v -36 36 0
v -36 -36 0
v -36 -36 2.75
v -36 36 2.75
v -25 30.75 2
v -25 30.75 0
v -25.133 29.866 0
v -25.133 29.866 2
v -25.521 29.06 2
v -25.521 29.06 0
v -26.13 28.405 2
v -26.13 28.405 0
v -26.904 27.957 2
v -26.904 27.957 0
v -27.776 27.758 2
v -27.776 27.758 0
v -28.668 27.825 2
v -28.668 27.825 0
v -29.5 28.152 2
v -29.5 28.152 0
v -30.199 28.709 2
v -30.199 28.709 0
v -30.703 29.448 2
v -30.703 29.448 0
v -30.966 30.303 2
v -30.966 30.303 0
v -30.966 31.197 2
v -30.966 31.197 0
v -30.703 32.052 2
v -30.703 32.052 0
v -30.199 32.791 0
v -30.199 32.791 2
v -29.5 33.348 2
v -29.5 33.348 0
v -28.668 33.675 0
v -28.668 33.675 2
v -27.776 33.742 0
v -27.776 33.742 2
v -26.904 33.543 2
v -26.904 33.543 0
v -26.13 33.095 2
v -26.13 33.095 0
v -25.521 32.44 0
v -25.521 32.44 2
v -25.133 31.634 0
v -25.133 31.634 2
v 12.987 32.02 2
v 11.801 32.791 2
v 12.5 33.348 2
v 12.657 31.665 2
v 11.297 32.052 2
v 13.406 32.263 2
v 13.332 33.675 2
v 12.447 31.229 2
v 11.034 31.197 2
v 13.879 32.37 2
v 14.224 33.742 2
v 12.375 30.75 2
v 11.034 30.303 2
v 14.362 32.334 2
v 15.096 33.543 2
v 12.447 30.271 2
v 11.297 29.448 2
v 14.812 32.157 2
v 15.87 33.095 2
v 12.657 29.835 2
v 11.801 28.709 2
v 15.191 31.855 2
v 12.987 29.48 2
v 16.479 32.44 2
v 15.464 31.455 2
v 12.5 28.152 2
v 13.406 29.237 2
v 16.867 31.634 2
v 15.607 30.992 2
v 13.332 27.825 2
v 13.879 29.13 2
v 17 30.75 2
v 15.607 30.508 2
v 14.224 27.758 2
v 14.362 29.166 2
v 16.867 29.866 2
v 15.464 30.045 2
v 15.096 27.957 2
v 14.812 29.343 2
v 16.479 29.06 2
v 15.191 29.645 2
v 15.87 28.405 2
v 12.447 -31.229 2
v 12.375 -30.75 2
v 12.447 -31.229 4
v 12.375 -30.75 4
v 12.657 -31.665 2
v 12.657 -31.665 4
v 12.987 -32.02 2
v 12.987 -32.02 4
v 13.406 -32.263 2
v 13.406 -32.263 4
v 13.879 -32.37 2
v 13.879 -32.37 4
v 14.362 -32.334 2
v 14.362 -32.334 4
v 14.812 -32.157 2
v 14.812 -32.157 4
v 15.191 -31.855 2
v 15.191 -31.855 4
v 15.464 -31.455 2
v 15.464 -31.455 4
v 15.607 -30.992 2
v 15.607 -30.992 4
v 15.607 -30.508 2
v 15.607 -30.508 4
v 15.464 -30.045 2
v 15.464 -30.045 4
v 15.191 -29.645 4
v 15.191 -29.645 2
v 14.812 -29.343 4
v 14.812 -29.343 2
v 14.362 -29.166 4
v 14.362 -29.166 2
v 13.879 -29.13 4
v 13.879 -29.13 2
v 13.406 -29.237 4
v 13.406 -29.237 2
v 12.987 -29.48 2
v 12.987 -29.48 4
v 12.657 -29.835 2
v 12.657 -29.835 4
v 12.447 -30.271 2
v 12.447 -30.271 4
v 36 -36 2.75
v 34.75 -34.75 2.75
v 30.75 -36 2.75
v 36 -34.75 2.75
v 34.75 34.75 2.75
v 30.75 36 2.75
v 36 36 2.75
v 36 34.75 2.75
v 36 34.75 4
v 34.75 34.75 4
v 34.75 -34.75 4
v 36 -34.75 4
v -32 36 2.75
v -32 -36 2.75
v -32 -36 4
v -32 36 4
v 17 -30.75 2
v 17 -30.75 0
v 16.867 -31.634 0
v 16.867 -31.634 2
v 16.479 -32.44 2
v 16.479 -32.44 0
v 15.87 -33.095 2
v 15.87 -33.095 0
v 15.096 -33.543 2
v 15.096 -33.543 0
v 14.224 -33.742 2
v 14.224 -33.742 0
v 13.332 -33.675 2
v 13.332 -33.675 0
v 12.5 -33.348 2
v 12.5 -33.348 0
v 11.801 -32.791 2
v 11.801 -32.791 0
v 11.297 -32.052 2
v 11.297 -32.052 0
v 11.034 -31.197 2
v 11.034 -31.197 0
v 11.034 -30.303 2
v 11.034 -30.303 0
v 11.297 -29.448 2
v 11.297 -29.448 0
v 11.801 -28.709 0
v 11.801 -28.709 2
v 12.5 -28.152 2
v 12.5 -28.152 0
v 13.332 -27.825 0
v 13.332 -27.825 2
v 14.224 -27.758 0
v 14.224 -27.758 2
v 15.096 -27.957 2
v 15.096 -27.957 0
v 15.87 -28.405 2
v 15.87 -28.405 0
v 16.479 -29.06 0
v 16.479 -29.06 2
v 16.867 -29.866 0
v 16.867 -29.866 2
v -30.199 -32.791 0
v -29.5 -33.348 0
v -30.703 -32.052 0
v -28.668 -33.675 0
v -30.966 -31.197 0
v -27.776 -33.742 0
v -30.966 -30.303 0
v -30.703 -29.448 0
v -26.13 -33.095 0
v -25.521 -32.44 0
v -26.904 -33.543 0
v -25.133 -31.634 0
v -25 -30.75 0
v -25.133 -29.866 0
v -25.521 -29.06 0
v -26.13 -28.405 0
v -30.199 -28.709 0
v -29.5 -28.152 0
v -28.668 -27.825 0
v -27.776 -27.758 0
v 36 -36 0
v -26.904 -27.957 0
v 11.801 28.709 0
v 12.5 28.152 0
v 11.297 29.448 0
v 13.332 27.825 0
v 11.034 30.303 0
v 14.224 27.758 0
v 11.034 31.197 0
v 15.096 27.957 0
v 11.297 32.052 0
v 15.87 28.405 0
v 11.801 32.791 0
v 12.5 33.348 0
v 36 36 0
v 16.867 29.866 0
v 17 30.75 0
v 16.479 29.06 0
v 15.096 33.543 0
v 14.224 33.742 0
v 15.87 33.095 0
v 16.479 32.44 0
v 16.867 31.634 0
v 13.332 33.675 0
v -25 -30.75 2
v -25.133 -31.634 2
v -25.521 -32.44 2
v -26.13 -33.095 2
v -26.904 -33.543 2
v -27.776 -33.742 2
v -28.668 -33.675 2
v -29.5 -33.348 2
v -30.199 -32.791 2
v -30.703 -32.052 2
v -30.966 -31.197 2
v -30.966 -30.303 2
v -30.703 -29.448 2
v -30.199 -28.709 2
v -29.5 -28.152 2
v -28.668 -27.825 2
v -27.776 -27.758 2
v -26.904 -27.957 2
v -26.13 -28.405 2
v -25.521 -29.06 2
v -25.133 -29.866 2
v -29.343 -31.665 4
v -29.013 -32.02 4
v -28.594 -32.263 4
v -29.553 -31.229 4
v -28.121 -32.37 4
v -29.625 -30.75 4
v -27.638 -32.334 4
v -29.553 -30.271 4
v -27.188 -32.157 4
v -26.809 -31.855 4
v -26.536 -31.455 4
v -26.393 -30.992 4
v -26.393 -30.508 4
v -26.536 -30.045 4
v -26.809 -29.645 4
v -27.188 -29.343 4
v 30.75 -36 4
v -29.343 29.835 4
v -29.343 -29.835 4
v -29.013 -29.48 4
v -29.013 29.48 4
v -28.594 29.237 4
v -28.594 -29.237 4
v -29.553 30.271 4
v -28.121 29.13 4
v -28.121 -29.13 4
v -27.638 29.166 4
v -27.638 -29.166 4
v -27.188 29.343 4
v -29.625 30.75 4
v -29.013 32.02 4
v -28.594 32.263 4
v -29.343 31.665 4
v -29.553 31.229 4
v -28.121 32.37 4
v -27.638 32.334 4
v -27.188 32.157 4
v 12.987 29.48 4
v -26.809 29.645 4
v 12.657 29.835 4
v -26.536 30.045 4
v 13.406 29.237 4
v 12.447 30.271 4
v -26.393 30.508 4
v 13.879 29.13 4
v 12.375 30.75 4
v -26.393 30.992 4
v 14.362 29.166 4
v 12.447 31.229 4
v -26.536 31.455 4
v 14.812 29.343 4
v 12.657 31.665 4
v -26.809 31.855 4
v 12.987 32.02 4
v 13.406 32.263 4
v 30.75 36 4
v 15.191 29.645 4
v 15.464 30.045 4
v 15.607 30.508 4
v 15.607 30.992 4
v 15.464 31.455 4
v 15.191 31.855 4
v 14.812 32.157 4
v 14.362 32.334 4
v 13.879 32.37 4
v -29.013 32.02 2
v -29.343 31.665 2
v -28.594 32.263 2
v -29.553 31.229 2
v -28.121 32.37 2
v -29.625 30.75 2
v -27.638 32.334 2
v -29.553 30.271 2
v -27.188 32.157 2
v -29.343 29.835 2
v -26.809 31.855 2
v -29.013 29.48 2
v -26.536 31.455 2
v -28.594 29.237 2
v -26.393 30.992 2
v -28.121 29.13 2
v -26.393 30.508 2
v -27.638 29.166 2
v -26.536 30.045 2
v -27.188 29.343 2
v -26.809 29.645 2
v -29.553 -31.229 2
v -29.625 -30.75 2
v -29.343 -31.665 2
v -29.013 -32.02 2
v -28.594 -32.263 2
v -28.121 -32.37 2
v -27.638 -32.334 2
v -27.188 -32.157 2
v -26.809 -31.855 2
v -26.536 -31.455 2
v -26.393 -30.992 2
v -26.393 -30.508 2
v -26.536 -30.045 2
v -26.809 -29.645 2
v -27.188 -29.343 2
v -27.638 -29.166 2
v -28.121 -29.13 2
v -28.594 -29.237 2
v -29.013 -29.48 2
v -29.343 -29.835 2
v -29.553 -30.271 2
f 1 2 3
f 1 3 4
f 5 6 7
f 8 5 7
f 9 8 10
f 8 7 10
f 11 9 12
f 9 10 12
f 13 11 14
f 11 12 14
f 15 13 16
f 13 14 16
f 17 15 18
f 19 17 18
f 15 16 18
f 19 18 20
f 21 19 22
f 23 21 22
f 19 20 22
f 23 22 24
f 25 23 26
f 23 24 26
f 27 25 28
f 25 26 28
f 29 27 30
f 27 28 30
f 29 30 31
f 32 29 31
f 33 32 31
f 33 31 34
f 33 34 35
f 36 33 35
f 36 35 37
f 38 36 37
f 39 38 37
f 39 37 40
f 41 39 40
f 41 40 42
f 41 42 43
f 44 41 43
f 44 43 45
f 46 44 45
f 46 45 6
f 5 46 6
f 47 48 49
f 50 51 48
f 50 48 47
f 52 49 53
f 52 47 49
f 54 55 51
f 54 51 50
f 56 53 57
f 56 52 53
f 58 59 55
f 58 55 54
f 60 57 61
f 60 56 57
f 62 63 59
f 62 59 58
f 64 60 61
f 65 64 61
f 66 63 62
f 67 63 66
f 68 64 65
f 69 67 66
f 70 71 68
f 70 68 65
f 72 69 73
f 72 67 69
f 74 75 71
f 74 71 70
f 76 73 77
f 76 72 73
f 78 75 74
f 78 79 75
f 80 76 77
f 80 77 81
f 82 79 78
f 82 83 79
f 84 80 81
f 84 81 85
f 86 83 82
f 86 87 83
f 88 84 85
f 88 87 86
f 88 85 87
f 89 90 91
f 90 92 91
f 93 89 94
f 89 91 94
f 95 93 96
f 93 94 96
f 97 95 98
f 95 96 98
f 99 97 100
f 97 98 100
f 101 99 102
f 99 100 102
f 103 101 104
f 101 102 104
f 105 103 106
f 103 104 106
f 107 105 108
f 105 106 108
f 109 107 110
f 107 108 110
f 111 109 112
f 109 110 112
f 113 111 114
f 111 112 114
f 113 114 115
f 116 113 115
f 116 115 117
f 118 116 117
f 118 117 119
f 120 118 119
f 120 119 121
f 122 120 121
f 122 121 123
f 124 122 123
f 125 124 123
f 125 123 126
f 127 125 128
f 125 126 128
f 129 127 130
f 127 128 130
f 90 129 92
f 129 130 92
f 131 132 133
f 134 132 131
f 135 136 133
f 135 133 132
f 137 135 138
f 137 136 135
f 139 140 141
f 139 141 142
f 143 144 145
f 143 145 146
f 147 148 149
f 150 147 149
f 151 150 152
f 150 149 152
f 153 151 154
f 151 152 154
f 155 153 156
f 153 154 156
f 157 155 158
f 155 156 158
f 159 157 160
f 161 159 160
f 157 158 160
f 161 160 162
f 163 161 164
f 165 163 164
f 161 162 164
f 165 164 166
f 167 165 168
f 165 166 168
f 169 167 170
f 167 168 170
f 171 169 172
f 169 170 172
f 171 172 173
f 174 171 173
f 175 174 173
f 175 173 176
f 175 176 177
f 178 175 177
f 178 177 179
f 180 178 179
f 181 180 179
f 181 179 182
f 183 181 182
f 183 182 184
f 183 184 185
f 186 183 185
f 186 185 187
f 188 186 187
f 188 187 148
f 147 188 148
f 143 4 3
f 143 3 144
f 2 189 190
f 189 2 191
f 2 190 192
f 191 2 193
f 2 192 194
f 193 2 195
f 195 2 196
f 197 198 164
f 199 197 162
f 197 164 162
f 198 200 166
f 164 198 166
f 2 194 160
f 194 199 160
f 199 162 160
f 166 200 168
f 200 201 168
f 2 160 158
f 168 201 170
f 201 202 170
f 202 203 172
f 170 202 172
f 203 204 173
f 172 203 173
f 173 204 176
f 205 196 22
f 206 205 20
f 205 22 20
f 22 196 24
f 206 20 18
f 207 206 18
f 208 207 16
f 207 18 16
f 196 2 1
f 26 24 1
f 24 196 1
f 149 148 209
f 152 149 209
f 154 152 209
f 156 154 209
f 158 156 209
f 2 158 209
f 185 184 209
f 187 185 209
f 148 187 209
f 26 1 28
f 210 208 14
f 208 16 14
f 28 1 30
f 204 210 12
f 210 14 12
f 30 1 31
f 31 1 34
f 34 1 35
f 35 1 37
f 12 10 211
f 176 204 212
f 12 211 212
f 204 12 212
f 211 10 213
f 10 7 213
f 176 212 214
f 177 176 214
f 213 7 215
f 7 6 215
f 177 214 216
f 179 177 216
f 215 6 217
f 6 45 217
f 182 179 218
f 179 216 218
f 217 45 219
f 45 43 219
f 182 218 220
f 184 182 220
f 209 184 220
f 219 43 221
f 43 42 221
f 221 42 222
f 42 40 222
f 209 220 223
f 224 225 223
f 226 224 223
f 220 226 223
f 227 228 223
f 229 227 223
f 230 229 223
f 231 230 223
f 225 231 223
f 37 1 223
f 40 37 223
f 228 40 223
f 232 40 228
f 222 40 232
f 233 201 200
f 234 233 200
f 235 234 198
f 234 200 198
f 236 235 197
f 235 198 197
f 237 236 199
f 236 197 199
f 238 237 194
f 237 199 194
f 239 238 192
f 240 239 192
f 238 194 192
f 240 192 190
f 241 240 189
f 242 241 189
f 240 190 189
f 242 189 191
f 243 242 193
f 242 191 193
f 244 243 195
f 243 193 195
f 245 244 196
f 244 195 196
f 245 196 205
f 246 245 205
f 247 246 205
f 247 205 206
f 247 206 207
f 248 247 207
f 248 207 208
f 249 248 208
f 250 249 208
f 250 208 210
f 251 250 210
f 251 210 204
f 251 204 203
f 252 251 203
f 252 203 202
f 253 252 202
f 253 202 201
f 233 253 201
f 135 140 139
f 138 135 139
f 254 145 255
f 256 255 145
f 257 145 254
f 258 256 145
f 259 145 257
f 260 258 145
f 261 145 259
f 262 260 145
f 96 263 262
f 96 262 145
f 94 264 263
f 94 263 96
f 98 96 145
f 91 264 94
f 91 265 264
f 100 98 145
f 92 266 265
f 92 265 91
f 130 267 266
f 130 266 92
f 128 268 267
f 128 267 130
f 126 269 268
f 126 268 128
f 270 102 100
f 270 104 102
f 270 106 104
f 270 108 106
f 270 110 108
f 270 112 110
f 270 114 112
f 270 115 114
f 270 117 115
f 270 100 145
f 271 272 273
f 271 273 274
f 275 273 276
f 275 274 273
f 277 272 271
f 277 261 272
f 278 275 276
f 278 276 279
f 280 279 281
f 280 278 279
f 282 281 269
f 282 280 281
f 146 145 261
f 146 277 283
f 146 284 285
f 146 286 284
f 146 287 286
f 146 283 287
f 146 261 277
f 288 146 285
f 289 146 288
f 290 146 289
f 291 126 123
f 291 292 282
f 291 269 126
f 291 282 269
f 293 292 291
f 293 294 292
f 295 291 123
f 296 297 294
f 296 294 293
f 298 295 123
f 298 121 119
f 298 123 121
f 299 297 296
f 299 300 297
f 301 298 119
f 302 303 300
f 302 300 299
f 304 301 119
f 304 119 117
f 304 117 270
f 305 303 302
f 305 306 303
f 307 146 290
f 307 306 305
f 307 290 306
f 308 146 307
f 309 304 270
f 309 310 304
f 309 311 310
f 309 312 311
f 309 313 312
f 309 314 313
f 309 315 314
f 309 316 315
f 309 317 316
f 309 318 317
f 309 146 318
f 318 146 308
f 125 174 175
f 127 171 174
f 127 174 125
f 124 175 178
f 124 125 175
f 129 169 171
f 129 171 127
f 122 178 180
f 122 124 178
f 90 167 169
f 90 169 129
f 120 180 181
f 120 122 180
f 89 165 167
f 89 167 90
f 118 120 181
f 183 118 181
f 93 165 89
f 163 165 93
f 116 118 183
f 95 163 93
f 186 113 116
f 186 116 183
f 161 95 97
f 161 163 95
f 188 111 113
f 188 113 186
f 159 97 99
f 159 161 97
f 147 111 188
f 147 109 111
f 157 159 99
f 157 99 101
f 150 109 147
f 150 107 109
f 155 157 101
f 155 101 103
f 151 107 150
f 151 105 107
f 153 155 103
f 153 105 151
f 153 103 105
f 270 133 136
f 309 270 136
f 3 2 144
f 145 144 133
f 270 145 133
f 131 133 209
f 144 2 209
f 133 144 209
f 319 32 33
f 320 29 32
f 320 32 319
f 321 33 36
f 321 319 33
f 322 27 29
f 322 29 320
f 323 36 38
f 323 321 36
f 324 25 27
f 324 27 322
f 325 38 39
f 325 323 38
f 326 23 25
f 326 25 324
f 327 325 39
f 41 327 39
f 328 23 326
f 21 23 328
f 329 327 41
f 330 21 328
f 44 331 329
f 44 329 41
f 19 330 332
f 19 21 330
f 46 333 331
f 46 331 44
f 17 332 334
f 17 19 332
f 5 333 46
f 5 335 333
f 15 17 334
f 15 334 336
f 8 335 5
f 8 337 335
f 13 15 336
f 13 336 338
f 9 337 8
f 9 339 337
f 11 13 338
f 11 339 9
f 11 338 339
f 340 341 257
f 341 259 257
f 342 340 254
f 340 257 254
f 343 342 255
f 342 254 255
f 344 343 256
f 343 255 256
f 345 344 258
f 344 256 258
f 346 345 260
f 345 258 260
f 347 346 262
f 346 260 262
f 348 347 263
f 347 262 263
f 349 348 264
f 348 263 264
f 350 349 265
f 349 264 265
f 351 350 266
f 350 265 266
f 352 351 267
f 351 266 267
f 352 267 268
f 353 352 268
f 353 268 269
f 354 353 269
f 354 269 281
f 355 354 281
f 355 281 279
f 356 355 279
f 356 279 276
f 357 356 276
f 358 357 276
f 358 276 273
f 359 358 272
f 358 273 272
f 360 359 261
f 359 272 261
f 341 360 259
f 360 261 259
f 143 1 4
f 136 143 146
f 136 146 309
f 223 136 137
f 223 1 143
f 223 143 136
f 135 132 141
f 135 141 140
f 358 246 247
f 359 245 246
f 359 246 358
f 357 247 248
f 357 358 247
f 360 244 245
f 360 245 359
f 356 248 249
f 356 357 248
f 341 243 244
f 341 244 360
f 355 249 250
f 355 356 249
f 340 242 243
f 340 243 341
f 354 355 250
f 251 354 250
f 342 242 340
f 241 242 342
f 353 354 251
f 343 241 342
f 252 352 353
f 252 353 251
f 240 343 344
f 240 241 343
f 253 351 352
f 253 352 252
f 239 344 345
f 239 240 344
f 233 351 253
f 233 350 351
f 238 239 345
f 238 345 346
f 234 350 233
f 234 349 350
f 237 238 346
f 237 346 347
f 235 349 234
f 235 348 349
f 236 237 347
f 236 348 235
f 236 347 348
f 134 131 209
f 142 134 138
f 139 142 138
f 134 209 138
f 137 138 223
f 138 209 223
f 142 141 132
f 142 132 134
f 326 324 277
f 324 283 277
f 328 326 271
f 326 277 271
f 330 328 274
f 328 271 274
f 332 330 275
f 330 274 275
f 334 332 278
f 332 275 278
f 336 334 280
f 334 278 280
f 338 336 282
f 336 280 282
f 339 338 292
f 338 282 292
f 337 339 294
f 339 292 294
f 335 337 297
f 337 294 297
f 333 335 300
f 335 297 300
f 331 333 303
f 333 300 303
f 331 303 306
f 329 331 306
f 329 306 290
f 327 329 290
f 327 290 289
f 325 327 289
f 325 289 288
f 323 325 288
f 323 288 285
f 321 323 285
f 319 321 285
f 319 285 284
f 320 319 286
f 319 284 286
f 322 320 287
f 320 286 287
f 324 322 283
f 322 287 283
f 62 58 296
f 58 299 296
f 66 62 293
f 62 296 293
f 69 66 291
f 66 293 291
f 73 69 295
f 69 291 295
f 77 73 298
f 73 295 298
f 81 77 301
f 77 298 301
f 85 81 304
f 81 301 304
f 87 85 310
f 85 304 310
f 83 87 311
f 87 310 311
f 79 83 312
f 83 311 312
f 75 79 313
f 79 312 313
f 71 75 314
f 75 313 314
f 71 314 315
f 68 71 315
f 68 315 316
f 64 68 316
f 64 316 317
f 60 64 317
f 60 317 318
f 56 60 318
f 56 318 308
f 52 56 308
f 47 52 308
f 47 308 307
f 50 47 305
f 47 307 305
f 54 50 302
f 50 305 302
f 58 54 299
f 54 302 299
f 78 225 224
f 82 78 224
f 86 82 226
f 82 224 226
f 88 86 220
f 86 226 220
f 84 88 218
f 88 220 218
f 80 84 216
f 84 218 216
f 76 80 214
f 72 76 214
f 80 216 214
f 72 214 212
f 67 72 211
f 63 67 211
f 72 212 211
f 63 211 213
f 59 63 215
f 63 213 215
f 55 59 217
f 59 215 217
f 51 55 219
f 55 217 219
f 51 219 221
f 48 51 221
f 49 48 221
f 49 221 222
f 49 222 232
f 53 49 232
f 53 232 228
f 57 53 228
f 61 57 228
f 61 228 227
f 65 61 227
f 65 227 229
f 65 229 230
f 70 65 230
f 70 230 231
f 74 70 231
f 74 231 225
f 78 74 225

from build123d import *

# Parameters (mm, degrees)
F0_W           = 72
F0_H           = 72
F1_DEPTH       = 2.75
F2_W           = 62.75
F2_H           = 72
F2_W_2         = 1.25
F3_DEPTH       = 1.25
F5_D           = 3.25
F5_DEPTH       = 8
F5_CBORE_D     = 6
F5_CBORE_DEPTH = 2
F6_W           = 1.25
F6_H           = 1.25
F7_DEPTH       = 1.25


with BuildPart() as f1:
    # F0 (on Top) → F1 (new body)
    with BuildSketch(Plane.XY):
        Rectangle(F0_W, F0_H)
    extrude(amount=F1_DEPTH)

    # F2 (on face) → F3 (join)
    with BuildSketch(Plane.XY.offset(2.75)):
        with Locations((-0.625, 0)):
            Rectangle(F2_W, F2_H)
        with Locations((35.375, 0)):
            Rectangle(F2_W_2, F2_H)
    extrude(amount=F3_DEPTH)

    # F5
    with Locations(Plane(origin=(0, 0, 0), x_dir=(1, 0, 0), z_dir=(0, 0, -1))):
        with Locations((-28, -30.75), (14, -30.75), (-28, 30.75), (14, 30.75)):
            CounterBoreHole(F5_D / 2, F5_CBORE_D / 2, F5_CBORE_DEPTH, depth=F5_DEPTH)

    # F6 (on face) → F7 (cut)
    with BuildSketch(Plane.XY.offset(4)):
        with Locations((35.375, 35.375)):
            Rectangle(F6_W, F6_H)
        with Locations((35.375, -35.375)):
            Rectangle(F6_W, F6_H)
    extrude(amount=-F7_DEPTH, mode=Mode.SUBTRACT)


solid = f1.part
